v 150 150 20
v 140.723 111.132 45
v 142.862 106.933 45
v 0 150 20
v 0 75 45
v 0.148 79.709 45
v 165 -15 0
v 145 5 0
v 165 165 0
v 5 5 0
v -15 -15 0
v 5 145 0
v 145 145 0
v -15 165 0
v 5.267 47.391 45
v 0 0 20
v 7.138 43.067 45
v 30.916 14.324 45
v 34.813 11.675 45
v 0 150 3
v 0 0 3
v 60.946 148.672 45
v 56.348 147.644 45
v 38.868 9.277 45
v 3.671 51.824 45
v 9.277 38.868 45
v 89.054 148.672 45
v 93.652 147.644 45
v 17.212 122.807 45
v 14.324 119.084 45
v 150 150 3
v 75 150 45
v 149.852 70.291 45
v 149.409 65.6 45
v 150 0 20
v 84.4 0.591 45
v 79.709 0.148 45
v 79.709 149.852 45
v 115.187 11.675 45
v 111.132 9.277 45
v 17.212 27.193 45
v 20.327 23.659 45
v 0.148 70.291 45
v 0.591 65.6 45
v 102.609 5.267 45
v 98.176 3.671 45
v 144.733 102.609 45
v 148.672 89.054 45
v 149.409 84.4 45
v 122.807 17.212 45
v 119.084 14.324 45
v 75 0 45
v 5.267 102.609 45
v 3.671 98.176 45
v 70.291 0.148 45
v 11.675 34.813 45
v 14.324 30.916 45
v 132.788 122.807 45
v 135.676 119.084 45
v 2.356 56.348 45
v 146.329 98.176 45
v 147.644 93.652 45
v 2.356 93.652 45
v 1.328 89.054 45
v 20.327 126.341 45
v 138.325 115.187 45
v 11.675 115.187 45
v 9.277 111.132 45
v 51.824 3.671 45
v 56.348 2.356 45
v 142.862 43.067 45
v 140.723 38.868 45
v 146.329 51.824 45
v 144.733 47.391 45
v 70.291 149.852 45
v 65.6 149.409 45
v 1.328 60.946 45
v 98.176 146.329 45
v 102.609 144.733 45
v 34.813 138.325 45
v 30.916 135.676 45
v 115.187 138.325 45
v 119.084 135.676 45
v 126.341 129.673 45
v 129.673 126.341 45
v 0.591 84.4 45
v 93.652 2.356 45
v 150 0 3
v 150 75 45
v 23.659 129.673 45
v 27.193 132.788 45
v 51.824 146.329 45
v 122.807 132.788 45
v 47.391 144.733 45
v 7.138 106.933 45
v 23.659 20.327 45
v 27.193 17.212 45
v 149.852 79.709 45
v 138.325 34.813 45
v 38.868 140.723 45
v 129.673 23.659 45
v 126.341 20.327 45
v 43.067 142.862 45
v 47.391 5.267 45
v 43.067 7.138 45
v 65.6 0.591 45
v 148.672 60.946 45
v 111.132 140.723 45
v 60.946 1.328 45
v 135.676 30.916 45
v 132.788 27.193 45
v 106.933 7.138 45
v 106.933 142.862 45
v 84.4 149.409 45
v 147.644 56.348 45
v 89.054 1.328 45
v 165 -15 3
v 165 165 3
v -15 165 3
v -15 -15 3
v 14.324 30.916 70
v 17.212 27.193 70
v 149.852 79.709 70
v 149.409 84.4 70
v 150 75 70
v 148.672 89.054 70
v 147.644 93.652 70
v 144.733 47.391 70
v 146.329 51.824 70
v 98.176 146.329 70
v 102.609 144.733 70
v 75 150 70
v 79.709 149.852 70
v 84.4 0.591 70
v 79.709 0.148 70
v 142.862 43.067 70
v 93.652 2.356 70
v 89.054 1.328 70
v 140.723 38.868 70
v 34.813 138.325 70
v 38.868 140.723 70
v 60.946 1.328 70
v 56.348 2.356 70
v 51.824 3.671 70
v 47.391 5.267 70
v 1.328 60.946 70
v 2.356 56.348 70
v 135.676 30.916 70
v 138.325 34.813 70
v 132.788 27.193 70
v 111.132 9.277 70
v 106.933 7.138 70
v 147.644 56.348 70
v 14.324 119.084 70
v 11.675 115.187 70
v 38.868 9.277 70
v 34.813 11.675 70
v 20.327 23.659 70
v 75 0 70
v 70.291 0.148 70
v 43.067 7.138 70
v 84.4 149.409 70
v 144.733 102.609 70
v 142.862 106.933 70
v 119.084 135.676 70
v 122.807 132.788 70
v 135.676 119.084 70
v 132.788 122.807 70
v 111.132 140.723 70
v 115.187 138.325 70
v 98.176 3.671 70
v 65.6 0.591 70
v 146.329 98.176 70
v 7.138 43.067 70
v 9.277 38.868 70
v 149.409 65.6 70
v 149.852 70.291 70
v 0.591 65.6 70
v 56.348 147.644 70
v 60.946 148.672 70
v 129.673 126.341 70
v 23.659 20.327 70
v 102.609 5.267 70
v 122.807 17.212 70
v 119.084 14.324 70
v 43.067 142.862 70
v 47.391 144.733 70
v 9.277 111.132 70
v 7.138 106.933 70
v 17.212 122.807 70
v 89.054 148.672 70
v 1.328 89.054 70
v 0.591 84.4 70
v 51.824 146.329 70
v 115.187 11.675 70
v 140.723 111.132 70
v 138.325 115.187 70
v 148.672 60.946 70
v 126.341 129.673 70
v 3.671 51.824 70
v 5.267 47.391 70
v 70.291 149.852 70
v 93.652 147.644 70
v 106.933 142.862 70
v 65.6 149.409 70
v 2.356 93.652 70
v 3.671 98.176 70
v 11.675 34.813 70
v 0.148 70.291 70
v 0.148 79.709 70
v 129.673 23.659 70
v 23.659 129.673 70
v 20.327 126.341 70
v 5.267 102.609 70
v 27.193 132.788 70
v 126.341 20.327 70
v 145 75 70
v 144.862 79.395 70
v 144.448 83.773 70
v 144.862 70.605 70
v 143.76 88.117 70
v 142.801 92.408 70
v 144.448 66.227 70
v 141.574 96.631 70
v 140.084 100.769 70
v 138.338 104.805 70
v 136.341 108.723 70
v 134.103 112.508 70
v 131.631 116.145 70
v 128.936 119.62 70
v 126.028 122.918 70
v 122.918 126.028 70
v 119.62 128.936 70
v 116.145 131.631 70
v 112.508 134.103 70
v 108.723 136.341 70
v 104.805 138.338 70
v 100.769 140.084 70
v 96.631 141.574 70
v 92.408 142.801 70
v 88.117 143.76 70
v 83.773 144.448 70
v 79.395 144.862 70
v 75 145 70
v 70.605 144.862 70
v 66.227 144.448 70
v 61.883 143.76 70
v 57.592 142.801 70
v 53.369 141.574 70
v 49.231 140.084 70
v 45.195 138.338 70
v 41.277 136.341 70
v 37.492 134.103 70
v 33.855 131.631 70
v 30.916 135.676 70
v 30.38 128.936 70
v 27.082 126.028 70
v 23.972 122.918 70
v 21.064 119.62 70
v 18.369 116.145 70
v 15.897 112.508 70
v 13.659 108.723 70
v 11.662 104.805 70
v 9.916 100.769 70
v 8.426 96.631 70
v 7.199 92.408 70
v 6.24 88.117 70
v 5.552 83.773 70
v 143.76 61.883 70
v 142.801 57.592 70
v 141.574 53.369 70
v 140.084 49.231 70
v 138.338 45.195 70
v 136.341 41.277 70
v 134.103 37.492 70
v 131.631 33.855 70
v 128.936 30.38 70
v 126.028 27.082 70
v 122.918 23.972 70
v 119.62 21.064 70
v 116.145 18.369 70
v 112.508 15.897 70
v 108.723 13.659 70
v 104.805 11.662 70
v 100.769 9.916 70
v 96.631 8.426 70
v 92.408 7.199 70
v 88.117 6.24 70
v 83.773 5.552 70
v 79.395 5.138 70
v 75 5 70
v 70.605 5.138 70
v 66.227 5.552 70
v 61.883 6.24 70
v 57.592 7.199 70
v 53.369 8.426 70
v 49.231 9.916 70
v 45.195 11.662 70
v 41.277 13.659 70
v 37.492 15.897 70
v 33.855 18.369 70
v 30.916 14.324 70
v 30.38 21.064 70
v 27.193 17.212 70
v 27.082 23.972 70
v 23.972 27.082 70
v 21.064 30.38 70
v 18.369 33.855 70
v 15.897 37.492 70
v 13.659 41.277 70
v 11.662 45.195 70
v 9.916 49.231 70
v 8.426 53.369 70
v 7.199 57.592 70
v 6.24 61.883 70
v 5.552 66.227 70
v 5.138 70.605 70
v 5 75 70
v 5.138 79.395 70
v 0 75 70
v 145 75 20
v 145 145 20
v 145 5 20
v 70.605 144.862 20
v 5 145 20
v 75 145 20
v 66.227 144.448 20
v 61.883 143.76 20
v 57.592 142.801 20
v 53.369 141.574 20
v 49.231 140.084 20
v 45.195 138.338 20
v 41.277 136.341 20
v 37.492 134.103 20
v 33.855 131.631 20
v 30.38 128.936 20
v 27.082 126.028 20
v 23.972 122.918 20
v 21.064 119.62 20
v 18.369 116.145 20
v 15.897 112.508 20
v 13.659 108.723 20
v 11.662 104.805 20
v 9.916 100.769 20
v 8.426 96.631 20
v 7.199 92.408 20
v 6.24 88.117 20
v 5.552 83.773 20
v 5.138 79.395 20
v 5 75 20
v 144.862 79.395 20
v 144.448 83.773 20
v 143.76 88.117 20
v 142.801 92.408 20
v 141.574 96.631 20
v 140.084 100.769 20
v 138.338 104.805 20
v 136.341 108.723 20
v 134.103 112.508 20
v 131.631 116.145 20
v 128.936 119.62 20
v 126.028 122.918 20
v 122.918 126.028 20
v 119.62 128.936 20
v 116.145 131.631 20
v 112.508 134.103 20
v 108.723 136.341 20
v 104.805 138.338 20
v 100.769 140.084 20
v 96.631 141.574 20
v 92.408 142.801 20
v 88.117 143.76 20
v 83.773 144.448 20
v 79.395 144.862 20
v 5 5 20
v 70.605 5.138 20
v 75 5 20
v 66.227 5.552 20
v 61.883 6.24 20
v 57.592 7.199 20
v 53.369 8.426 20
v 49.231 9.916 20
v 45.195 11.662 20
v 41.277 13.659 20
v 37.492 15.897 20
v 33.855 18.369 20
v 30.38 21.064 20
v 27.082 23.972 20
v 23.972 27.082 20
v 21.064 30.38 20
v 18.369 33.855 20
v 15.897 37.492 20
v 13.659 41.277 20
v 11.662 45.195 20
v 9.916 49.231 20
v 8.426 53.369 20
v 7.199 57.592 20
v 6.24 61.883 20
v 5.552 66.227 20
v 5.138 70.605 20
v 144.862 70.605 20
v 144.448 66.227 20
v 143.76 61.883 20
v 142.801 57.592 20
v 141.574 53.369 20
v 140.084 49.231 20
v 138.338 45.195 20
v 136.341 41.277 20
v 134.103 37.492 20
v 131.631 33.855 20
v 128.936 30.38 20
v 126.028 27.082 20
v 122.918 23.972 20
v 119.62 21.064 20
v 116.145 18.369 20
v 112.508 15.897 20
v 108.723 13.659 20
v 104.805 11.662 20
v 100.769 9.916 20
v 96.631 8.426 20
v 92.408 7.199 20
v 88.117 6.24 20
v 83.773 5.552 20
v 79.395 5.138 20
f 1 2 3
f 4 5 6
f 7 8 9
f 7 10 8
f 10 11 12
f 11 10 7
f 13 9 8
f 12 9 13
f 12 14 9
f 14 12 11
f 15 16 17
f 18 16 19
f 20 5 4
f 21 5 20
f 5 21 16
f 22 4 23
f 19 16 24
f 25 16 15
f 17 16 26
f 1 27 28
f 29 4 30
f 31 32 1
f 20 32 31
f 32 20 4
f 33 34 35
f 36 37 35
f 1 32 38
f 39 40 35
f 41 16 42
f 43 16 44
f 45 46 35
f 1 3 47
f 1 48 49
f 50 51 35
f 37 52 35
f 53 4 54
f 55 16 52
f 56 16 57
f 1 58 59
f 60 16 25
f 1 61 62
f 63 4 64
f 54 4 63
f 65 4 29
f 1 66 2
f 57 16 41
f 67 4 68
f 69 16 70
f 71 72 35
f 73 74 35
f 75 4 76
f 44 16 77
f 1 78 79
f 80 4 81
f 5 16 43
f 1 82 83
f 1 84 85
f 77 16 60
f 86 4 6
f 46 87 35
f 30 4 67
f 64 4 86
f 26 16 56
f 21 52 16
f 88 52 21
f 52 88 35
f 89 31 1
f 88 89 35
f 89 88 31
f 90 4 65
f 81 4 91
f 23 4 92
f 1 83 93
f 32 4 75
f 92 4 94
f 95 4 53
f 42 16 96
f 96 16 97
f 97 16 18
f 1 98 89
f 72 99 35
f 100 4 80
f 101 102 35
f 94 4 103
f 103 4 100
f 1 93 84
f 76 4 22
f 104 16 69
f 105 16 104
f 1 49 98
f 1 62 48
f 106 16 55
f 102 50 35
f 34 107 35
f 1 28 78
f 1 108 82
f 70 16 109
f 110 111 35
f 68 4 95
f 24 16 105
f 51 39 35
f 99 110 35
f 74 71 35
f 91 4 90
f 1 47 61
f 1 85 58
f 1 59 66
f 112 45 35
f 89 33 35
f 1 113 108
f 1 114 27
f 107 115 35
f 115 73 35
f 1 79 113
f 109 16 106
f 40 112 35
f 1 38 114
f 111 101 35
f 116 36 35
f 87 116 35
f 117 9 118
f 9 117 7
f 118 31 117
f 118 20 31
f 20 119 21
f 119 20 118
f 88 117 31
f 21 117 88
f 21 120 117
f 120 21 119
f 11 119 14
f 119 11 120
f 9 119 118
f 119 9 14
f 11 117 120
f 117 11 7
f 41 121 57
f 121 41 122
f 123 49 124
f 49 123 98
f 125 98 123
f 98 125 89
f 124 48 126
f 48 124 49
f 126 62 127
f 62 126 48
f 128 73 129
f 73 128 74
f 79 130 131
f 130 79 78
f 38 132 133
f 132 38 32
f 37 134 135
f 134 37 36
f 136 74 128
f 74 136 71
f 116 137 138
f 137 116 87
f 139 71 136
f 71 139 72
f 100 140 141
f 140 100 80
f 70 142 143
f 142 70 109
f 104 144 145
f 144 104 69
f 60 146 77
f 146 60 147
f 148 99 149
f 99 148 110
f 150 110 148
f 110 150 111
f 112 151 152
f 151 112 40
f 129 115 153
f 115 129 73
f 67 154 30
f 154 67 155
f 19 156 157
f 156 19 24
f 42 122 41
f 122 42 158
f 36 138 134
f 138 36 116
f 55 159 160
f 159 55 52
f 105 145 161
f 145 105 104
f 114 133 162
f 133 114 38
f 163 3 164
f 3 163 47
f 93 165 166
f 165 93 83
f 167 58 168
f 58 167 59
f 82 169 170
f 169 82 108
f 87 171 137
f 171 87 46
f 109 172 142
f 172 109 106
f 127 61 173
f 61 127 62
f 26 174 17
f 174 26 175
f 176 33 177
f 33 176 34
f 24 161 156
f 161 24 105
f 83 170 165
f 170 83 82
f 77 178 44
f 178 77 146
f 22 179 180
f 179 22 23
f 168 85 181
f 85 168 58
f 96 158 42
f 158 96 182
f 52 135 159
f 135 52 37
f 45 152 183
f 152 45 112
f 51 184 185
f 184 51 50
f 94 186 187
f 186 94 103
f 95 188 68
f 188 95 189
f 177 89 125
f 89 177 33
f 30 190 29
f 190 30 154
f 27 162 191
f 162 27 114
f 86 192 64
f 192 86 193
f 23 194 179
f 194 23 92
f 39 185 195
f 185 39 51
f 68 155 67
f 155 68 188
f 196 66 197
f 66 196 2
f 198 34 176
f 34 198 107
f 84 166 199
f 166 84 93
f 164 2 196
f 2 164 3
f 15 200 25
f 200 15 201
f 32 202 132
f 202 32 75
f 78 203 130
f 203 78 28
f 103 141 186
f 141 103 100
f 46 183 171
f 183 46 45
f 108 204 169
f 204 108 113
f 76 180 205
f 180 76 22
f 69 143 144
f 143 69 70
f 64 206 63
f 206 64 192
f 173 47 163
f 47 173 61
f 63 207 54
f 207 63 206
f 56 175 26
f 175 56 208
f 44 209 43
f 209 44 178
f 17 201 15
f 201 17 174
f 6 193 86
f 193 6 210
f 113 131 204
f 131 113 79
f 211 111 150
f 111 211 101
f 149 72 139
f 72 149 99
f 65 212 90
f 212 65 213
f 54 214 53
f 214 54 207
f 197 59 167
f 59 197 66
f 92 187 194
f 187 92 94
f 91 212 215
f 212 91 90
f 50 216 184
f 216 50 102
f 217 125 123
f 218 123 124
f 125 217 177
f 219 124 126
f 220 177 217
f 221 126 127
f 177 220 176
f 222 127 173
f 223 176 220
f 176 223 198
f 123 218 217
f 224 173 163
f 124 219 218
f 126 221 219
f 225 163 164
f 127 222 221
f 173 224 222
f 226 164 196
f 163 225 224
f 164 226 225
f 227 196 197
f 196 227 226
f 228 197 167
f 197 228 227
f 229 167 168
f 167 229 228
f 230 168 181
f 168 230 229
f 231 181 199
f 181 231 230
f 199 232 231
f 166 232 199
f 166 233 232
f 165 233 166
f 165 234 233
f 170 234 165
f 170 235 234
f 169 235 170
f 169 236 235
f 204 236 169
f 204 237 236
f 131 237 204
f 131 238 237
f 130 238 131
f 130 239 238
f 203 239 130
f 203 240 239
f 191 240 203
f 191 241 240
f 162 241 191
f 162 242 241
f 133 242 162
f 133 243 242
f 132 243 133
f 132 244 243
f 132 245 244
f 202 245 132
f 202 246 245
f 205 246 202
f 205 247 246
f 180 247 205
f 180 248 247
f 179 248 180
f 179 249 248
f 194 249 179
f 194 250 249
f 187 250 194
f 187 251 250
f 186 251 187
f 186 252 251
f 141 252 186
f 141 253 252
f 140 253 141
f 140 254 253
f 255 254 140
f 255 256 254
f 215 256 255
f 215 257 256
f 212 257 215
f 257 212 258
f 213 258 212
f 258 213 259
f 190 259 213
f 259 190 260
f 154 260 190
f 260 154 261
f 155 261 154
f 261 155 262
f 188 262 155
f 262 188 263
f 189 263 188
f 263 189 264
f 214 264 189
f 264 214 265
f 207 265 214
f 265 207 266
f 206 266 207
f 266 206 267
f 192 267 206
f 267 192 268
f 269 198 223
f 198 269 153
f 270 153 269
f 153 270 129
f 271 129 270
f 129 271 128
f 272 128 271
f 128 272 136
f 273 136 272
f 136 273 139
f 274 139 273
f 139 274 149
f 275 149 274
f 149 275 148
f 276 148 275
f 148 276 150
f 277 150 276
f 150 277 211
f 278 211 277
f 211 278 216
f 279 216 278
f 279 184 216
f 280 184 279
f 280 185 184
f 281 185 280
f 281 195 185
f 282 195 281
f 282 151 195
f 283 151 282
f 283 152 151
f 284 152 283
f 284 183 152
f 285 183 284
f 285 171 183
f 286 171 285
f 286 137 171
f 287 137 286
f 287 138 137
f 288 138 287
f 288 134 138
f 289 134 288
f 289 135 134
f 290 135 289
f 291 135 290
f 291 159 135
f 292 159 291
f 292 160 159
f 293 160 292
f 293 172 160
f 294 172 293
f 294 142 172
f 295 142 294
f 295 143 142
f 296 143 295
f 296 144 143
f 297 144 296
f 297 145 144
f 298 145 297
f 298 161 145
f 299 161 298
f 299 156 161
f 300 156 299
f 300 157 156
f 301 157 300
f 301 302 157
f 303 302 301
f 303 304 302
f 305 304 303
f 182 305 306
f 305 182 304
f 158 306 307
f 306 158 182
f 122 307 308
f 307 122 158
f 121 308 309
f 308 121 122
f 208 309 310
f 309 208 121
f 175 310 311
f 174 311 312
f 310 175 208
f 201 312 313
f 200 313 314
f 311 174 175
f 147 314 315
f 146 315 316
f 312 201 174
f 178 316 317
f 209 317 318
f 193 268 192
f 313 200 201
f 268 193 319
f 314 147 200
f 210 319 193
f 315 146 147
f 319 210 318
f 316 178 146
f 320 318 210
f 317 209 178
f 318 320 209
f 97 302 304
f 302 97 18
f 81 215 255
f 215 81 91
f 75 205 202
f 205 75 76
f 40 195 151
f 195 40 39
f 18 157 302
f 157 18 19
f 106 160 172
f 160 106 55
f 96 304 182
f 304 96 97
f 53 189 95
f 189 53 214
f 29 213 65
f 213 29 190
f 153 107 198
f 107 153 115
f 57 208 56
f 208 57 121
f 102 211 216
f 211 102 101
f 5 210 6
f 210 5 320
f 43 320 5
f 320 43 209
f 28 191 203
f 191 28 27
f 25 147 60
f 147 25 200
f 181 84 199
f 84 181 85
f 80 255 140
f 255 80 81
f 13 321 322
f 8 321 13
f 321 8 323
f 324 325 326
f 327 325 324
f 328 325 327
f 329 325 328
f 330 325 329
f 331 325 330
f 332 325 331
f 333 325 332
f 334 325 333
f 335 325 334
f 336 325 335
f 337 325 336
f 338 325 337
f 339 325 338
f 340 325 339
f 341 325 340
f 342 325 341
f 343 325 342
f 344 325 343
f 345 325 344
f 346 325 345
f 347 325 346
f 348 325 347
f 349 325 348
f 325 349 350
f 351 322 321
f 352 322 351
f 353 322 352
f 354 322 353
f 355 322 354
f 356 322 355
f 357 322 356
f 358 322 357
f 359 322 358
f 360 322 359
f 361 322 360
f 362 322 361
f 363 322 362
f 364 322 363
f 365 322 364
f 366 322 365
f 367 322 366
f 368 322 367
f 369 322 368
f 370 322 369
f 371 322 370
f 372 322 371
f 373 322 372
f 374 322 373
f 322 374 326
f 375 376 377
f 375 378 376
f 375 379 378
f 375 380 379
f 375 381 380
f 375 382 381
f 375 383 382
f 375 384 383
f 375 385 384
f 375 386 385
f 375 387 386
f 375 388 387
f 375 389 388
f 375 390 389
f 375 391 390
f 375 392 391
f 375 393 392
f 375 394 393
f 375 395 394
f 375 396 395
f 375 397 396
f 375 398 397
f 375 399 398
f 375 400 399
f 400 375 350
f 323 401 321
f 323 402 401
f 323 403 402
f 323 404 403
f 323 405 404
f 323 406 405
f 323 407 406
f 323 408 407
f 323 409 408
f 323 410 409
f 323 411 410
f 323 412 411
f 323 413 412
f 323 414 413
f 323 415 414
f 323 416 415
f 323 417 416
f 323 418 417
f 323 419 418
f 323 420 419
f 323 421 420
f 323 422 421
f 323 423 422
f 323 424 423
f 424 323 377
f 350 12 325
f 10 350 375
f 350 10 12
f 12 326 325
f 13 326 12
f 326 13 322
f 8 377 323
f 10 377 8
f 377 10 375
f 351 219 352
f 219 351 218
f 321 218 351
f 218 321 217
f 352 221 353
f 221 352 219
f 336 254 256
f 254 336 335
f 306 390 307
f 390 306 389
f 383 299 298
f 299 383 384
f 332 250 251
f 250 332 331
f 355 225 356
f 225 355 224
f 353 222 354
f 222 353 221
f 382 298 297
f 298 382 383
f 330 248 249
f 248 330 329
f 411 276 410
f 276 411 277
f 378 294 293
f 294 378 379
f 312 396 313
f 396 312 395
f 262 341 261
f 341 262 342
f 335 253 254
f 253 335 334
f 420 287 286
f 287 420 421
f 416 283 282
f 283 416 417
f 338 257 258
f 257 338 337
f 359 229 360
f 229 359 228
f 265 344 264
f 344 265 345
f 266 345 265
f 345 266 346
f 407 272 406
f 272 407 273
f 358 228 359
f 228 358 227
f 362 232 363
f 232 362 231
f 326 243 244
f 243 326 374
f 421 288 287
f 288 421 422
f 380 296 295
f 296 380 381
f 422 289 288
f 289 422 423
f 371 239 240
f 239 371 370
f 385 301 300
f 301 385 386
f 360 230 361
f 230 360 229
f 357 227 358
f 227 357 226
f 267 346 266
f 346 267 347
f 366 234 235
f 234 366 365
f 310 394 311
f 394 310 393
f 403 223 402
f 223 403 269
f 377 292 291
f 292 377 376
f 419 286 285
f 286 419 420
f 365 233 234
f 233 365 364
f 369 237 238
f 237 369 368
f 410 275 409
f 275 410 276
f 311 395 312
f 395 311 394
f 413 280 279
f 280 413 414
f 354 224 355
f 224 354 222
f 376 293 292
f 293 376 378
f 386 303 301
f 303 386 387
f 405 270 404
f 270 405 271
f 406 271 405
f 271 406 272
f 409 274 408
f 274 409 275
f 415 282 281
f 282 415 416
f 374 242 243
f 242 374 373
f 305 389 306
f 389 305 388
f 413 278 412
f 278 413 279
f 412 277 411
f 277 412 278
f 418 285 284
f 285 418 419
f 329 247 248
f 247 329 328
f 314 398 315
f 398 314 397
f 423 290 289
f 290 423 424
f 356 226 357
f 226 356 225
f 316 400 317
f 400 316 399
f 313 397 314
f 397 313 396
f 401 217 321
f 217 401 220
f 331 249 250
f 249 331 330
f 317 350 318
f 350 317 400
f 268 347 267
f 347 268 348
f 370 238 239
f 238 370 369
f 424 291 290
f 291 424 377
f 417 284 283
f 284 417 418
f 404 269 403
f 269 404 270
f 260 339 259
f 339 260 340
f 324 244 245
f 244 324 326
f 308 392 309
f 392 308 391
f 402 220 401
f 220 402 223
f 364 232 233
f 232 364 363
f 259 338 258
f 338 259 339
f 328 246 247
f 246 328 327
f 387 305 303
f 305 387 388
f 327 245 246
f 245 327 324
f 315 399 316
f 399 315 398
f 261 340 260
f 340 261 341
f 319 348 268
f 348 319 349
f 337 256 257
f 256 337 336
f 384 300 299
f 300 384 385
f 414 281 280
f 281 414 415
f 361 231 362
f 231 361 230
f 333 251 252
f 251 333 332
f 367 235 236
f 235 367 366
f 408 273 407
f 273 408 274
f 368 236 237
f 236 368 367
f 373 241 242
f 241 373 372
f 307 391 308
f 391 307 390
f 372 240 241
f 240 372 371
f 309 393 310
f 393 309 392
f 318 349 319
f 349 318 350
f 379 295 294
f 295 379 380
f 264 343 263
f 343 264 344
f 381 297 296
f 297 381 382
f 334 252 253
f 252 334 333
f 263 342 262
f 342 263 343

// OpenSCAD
$fn = 100;

box_w = 150;
box_h = 20;
pipe_h = 25;
pipe_r = box_w / 2;
wall = 5;

flange_offset = 15;
flange_w = box_w + (flange_offset * 2);
flange_h = 3;


difference() {
    union() {
        hull() {
            cube([box_w, box_w, box_h]);
            translate([(box_w / 2), (box_w / 2), box_h]) {
                cylinder(h = pipe_h, r = pipe_r);
            }
        }
        translate([-flange_offset, -flange_offset, 0]) {
            cube([flange_w, flange_w, flange_h]);
        }
        translate([pipe_r, pipe_r, (box_h + pipe_h)]) {
            cylinder(h = pipe_h, r = pipe_r);
        }
    }

    translate([wall, wall, 0]) {
        cube([(box_w - (wall * 2)), (box_w - (wall * 2)), box_h]);
    }

    translate([pipe_r, pipe_r, box_h]) {
        cylinder(h = box_w, r = (pipe_r - wall));
    }
}
